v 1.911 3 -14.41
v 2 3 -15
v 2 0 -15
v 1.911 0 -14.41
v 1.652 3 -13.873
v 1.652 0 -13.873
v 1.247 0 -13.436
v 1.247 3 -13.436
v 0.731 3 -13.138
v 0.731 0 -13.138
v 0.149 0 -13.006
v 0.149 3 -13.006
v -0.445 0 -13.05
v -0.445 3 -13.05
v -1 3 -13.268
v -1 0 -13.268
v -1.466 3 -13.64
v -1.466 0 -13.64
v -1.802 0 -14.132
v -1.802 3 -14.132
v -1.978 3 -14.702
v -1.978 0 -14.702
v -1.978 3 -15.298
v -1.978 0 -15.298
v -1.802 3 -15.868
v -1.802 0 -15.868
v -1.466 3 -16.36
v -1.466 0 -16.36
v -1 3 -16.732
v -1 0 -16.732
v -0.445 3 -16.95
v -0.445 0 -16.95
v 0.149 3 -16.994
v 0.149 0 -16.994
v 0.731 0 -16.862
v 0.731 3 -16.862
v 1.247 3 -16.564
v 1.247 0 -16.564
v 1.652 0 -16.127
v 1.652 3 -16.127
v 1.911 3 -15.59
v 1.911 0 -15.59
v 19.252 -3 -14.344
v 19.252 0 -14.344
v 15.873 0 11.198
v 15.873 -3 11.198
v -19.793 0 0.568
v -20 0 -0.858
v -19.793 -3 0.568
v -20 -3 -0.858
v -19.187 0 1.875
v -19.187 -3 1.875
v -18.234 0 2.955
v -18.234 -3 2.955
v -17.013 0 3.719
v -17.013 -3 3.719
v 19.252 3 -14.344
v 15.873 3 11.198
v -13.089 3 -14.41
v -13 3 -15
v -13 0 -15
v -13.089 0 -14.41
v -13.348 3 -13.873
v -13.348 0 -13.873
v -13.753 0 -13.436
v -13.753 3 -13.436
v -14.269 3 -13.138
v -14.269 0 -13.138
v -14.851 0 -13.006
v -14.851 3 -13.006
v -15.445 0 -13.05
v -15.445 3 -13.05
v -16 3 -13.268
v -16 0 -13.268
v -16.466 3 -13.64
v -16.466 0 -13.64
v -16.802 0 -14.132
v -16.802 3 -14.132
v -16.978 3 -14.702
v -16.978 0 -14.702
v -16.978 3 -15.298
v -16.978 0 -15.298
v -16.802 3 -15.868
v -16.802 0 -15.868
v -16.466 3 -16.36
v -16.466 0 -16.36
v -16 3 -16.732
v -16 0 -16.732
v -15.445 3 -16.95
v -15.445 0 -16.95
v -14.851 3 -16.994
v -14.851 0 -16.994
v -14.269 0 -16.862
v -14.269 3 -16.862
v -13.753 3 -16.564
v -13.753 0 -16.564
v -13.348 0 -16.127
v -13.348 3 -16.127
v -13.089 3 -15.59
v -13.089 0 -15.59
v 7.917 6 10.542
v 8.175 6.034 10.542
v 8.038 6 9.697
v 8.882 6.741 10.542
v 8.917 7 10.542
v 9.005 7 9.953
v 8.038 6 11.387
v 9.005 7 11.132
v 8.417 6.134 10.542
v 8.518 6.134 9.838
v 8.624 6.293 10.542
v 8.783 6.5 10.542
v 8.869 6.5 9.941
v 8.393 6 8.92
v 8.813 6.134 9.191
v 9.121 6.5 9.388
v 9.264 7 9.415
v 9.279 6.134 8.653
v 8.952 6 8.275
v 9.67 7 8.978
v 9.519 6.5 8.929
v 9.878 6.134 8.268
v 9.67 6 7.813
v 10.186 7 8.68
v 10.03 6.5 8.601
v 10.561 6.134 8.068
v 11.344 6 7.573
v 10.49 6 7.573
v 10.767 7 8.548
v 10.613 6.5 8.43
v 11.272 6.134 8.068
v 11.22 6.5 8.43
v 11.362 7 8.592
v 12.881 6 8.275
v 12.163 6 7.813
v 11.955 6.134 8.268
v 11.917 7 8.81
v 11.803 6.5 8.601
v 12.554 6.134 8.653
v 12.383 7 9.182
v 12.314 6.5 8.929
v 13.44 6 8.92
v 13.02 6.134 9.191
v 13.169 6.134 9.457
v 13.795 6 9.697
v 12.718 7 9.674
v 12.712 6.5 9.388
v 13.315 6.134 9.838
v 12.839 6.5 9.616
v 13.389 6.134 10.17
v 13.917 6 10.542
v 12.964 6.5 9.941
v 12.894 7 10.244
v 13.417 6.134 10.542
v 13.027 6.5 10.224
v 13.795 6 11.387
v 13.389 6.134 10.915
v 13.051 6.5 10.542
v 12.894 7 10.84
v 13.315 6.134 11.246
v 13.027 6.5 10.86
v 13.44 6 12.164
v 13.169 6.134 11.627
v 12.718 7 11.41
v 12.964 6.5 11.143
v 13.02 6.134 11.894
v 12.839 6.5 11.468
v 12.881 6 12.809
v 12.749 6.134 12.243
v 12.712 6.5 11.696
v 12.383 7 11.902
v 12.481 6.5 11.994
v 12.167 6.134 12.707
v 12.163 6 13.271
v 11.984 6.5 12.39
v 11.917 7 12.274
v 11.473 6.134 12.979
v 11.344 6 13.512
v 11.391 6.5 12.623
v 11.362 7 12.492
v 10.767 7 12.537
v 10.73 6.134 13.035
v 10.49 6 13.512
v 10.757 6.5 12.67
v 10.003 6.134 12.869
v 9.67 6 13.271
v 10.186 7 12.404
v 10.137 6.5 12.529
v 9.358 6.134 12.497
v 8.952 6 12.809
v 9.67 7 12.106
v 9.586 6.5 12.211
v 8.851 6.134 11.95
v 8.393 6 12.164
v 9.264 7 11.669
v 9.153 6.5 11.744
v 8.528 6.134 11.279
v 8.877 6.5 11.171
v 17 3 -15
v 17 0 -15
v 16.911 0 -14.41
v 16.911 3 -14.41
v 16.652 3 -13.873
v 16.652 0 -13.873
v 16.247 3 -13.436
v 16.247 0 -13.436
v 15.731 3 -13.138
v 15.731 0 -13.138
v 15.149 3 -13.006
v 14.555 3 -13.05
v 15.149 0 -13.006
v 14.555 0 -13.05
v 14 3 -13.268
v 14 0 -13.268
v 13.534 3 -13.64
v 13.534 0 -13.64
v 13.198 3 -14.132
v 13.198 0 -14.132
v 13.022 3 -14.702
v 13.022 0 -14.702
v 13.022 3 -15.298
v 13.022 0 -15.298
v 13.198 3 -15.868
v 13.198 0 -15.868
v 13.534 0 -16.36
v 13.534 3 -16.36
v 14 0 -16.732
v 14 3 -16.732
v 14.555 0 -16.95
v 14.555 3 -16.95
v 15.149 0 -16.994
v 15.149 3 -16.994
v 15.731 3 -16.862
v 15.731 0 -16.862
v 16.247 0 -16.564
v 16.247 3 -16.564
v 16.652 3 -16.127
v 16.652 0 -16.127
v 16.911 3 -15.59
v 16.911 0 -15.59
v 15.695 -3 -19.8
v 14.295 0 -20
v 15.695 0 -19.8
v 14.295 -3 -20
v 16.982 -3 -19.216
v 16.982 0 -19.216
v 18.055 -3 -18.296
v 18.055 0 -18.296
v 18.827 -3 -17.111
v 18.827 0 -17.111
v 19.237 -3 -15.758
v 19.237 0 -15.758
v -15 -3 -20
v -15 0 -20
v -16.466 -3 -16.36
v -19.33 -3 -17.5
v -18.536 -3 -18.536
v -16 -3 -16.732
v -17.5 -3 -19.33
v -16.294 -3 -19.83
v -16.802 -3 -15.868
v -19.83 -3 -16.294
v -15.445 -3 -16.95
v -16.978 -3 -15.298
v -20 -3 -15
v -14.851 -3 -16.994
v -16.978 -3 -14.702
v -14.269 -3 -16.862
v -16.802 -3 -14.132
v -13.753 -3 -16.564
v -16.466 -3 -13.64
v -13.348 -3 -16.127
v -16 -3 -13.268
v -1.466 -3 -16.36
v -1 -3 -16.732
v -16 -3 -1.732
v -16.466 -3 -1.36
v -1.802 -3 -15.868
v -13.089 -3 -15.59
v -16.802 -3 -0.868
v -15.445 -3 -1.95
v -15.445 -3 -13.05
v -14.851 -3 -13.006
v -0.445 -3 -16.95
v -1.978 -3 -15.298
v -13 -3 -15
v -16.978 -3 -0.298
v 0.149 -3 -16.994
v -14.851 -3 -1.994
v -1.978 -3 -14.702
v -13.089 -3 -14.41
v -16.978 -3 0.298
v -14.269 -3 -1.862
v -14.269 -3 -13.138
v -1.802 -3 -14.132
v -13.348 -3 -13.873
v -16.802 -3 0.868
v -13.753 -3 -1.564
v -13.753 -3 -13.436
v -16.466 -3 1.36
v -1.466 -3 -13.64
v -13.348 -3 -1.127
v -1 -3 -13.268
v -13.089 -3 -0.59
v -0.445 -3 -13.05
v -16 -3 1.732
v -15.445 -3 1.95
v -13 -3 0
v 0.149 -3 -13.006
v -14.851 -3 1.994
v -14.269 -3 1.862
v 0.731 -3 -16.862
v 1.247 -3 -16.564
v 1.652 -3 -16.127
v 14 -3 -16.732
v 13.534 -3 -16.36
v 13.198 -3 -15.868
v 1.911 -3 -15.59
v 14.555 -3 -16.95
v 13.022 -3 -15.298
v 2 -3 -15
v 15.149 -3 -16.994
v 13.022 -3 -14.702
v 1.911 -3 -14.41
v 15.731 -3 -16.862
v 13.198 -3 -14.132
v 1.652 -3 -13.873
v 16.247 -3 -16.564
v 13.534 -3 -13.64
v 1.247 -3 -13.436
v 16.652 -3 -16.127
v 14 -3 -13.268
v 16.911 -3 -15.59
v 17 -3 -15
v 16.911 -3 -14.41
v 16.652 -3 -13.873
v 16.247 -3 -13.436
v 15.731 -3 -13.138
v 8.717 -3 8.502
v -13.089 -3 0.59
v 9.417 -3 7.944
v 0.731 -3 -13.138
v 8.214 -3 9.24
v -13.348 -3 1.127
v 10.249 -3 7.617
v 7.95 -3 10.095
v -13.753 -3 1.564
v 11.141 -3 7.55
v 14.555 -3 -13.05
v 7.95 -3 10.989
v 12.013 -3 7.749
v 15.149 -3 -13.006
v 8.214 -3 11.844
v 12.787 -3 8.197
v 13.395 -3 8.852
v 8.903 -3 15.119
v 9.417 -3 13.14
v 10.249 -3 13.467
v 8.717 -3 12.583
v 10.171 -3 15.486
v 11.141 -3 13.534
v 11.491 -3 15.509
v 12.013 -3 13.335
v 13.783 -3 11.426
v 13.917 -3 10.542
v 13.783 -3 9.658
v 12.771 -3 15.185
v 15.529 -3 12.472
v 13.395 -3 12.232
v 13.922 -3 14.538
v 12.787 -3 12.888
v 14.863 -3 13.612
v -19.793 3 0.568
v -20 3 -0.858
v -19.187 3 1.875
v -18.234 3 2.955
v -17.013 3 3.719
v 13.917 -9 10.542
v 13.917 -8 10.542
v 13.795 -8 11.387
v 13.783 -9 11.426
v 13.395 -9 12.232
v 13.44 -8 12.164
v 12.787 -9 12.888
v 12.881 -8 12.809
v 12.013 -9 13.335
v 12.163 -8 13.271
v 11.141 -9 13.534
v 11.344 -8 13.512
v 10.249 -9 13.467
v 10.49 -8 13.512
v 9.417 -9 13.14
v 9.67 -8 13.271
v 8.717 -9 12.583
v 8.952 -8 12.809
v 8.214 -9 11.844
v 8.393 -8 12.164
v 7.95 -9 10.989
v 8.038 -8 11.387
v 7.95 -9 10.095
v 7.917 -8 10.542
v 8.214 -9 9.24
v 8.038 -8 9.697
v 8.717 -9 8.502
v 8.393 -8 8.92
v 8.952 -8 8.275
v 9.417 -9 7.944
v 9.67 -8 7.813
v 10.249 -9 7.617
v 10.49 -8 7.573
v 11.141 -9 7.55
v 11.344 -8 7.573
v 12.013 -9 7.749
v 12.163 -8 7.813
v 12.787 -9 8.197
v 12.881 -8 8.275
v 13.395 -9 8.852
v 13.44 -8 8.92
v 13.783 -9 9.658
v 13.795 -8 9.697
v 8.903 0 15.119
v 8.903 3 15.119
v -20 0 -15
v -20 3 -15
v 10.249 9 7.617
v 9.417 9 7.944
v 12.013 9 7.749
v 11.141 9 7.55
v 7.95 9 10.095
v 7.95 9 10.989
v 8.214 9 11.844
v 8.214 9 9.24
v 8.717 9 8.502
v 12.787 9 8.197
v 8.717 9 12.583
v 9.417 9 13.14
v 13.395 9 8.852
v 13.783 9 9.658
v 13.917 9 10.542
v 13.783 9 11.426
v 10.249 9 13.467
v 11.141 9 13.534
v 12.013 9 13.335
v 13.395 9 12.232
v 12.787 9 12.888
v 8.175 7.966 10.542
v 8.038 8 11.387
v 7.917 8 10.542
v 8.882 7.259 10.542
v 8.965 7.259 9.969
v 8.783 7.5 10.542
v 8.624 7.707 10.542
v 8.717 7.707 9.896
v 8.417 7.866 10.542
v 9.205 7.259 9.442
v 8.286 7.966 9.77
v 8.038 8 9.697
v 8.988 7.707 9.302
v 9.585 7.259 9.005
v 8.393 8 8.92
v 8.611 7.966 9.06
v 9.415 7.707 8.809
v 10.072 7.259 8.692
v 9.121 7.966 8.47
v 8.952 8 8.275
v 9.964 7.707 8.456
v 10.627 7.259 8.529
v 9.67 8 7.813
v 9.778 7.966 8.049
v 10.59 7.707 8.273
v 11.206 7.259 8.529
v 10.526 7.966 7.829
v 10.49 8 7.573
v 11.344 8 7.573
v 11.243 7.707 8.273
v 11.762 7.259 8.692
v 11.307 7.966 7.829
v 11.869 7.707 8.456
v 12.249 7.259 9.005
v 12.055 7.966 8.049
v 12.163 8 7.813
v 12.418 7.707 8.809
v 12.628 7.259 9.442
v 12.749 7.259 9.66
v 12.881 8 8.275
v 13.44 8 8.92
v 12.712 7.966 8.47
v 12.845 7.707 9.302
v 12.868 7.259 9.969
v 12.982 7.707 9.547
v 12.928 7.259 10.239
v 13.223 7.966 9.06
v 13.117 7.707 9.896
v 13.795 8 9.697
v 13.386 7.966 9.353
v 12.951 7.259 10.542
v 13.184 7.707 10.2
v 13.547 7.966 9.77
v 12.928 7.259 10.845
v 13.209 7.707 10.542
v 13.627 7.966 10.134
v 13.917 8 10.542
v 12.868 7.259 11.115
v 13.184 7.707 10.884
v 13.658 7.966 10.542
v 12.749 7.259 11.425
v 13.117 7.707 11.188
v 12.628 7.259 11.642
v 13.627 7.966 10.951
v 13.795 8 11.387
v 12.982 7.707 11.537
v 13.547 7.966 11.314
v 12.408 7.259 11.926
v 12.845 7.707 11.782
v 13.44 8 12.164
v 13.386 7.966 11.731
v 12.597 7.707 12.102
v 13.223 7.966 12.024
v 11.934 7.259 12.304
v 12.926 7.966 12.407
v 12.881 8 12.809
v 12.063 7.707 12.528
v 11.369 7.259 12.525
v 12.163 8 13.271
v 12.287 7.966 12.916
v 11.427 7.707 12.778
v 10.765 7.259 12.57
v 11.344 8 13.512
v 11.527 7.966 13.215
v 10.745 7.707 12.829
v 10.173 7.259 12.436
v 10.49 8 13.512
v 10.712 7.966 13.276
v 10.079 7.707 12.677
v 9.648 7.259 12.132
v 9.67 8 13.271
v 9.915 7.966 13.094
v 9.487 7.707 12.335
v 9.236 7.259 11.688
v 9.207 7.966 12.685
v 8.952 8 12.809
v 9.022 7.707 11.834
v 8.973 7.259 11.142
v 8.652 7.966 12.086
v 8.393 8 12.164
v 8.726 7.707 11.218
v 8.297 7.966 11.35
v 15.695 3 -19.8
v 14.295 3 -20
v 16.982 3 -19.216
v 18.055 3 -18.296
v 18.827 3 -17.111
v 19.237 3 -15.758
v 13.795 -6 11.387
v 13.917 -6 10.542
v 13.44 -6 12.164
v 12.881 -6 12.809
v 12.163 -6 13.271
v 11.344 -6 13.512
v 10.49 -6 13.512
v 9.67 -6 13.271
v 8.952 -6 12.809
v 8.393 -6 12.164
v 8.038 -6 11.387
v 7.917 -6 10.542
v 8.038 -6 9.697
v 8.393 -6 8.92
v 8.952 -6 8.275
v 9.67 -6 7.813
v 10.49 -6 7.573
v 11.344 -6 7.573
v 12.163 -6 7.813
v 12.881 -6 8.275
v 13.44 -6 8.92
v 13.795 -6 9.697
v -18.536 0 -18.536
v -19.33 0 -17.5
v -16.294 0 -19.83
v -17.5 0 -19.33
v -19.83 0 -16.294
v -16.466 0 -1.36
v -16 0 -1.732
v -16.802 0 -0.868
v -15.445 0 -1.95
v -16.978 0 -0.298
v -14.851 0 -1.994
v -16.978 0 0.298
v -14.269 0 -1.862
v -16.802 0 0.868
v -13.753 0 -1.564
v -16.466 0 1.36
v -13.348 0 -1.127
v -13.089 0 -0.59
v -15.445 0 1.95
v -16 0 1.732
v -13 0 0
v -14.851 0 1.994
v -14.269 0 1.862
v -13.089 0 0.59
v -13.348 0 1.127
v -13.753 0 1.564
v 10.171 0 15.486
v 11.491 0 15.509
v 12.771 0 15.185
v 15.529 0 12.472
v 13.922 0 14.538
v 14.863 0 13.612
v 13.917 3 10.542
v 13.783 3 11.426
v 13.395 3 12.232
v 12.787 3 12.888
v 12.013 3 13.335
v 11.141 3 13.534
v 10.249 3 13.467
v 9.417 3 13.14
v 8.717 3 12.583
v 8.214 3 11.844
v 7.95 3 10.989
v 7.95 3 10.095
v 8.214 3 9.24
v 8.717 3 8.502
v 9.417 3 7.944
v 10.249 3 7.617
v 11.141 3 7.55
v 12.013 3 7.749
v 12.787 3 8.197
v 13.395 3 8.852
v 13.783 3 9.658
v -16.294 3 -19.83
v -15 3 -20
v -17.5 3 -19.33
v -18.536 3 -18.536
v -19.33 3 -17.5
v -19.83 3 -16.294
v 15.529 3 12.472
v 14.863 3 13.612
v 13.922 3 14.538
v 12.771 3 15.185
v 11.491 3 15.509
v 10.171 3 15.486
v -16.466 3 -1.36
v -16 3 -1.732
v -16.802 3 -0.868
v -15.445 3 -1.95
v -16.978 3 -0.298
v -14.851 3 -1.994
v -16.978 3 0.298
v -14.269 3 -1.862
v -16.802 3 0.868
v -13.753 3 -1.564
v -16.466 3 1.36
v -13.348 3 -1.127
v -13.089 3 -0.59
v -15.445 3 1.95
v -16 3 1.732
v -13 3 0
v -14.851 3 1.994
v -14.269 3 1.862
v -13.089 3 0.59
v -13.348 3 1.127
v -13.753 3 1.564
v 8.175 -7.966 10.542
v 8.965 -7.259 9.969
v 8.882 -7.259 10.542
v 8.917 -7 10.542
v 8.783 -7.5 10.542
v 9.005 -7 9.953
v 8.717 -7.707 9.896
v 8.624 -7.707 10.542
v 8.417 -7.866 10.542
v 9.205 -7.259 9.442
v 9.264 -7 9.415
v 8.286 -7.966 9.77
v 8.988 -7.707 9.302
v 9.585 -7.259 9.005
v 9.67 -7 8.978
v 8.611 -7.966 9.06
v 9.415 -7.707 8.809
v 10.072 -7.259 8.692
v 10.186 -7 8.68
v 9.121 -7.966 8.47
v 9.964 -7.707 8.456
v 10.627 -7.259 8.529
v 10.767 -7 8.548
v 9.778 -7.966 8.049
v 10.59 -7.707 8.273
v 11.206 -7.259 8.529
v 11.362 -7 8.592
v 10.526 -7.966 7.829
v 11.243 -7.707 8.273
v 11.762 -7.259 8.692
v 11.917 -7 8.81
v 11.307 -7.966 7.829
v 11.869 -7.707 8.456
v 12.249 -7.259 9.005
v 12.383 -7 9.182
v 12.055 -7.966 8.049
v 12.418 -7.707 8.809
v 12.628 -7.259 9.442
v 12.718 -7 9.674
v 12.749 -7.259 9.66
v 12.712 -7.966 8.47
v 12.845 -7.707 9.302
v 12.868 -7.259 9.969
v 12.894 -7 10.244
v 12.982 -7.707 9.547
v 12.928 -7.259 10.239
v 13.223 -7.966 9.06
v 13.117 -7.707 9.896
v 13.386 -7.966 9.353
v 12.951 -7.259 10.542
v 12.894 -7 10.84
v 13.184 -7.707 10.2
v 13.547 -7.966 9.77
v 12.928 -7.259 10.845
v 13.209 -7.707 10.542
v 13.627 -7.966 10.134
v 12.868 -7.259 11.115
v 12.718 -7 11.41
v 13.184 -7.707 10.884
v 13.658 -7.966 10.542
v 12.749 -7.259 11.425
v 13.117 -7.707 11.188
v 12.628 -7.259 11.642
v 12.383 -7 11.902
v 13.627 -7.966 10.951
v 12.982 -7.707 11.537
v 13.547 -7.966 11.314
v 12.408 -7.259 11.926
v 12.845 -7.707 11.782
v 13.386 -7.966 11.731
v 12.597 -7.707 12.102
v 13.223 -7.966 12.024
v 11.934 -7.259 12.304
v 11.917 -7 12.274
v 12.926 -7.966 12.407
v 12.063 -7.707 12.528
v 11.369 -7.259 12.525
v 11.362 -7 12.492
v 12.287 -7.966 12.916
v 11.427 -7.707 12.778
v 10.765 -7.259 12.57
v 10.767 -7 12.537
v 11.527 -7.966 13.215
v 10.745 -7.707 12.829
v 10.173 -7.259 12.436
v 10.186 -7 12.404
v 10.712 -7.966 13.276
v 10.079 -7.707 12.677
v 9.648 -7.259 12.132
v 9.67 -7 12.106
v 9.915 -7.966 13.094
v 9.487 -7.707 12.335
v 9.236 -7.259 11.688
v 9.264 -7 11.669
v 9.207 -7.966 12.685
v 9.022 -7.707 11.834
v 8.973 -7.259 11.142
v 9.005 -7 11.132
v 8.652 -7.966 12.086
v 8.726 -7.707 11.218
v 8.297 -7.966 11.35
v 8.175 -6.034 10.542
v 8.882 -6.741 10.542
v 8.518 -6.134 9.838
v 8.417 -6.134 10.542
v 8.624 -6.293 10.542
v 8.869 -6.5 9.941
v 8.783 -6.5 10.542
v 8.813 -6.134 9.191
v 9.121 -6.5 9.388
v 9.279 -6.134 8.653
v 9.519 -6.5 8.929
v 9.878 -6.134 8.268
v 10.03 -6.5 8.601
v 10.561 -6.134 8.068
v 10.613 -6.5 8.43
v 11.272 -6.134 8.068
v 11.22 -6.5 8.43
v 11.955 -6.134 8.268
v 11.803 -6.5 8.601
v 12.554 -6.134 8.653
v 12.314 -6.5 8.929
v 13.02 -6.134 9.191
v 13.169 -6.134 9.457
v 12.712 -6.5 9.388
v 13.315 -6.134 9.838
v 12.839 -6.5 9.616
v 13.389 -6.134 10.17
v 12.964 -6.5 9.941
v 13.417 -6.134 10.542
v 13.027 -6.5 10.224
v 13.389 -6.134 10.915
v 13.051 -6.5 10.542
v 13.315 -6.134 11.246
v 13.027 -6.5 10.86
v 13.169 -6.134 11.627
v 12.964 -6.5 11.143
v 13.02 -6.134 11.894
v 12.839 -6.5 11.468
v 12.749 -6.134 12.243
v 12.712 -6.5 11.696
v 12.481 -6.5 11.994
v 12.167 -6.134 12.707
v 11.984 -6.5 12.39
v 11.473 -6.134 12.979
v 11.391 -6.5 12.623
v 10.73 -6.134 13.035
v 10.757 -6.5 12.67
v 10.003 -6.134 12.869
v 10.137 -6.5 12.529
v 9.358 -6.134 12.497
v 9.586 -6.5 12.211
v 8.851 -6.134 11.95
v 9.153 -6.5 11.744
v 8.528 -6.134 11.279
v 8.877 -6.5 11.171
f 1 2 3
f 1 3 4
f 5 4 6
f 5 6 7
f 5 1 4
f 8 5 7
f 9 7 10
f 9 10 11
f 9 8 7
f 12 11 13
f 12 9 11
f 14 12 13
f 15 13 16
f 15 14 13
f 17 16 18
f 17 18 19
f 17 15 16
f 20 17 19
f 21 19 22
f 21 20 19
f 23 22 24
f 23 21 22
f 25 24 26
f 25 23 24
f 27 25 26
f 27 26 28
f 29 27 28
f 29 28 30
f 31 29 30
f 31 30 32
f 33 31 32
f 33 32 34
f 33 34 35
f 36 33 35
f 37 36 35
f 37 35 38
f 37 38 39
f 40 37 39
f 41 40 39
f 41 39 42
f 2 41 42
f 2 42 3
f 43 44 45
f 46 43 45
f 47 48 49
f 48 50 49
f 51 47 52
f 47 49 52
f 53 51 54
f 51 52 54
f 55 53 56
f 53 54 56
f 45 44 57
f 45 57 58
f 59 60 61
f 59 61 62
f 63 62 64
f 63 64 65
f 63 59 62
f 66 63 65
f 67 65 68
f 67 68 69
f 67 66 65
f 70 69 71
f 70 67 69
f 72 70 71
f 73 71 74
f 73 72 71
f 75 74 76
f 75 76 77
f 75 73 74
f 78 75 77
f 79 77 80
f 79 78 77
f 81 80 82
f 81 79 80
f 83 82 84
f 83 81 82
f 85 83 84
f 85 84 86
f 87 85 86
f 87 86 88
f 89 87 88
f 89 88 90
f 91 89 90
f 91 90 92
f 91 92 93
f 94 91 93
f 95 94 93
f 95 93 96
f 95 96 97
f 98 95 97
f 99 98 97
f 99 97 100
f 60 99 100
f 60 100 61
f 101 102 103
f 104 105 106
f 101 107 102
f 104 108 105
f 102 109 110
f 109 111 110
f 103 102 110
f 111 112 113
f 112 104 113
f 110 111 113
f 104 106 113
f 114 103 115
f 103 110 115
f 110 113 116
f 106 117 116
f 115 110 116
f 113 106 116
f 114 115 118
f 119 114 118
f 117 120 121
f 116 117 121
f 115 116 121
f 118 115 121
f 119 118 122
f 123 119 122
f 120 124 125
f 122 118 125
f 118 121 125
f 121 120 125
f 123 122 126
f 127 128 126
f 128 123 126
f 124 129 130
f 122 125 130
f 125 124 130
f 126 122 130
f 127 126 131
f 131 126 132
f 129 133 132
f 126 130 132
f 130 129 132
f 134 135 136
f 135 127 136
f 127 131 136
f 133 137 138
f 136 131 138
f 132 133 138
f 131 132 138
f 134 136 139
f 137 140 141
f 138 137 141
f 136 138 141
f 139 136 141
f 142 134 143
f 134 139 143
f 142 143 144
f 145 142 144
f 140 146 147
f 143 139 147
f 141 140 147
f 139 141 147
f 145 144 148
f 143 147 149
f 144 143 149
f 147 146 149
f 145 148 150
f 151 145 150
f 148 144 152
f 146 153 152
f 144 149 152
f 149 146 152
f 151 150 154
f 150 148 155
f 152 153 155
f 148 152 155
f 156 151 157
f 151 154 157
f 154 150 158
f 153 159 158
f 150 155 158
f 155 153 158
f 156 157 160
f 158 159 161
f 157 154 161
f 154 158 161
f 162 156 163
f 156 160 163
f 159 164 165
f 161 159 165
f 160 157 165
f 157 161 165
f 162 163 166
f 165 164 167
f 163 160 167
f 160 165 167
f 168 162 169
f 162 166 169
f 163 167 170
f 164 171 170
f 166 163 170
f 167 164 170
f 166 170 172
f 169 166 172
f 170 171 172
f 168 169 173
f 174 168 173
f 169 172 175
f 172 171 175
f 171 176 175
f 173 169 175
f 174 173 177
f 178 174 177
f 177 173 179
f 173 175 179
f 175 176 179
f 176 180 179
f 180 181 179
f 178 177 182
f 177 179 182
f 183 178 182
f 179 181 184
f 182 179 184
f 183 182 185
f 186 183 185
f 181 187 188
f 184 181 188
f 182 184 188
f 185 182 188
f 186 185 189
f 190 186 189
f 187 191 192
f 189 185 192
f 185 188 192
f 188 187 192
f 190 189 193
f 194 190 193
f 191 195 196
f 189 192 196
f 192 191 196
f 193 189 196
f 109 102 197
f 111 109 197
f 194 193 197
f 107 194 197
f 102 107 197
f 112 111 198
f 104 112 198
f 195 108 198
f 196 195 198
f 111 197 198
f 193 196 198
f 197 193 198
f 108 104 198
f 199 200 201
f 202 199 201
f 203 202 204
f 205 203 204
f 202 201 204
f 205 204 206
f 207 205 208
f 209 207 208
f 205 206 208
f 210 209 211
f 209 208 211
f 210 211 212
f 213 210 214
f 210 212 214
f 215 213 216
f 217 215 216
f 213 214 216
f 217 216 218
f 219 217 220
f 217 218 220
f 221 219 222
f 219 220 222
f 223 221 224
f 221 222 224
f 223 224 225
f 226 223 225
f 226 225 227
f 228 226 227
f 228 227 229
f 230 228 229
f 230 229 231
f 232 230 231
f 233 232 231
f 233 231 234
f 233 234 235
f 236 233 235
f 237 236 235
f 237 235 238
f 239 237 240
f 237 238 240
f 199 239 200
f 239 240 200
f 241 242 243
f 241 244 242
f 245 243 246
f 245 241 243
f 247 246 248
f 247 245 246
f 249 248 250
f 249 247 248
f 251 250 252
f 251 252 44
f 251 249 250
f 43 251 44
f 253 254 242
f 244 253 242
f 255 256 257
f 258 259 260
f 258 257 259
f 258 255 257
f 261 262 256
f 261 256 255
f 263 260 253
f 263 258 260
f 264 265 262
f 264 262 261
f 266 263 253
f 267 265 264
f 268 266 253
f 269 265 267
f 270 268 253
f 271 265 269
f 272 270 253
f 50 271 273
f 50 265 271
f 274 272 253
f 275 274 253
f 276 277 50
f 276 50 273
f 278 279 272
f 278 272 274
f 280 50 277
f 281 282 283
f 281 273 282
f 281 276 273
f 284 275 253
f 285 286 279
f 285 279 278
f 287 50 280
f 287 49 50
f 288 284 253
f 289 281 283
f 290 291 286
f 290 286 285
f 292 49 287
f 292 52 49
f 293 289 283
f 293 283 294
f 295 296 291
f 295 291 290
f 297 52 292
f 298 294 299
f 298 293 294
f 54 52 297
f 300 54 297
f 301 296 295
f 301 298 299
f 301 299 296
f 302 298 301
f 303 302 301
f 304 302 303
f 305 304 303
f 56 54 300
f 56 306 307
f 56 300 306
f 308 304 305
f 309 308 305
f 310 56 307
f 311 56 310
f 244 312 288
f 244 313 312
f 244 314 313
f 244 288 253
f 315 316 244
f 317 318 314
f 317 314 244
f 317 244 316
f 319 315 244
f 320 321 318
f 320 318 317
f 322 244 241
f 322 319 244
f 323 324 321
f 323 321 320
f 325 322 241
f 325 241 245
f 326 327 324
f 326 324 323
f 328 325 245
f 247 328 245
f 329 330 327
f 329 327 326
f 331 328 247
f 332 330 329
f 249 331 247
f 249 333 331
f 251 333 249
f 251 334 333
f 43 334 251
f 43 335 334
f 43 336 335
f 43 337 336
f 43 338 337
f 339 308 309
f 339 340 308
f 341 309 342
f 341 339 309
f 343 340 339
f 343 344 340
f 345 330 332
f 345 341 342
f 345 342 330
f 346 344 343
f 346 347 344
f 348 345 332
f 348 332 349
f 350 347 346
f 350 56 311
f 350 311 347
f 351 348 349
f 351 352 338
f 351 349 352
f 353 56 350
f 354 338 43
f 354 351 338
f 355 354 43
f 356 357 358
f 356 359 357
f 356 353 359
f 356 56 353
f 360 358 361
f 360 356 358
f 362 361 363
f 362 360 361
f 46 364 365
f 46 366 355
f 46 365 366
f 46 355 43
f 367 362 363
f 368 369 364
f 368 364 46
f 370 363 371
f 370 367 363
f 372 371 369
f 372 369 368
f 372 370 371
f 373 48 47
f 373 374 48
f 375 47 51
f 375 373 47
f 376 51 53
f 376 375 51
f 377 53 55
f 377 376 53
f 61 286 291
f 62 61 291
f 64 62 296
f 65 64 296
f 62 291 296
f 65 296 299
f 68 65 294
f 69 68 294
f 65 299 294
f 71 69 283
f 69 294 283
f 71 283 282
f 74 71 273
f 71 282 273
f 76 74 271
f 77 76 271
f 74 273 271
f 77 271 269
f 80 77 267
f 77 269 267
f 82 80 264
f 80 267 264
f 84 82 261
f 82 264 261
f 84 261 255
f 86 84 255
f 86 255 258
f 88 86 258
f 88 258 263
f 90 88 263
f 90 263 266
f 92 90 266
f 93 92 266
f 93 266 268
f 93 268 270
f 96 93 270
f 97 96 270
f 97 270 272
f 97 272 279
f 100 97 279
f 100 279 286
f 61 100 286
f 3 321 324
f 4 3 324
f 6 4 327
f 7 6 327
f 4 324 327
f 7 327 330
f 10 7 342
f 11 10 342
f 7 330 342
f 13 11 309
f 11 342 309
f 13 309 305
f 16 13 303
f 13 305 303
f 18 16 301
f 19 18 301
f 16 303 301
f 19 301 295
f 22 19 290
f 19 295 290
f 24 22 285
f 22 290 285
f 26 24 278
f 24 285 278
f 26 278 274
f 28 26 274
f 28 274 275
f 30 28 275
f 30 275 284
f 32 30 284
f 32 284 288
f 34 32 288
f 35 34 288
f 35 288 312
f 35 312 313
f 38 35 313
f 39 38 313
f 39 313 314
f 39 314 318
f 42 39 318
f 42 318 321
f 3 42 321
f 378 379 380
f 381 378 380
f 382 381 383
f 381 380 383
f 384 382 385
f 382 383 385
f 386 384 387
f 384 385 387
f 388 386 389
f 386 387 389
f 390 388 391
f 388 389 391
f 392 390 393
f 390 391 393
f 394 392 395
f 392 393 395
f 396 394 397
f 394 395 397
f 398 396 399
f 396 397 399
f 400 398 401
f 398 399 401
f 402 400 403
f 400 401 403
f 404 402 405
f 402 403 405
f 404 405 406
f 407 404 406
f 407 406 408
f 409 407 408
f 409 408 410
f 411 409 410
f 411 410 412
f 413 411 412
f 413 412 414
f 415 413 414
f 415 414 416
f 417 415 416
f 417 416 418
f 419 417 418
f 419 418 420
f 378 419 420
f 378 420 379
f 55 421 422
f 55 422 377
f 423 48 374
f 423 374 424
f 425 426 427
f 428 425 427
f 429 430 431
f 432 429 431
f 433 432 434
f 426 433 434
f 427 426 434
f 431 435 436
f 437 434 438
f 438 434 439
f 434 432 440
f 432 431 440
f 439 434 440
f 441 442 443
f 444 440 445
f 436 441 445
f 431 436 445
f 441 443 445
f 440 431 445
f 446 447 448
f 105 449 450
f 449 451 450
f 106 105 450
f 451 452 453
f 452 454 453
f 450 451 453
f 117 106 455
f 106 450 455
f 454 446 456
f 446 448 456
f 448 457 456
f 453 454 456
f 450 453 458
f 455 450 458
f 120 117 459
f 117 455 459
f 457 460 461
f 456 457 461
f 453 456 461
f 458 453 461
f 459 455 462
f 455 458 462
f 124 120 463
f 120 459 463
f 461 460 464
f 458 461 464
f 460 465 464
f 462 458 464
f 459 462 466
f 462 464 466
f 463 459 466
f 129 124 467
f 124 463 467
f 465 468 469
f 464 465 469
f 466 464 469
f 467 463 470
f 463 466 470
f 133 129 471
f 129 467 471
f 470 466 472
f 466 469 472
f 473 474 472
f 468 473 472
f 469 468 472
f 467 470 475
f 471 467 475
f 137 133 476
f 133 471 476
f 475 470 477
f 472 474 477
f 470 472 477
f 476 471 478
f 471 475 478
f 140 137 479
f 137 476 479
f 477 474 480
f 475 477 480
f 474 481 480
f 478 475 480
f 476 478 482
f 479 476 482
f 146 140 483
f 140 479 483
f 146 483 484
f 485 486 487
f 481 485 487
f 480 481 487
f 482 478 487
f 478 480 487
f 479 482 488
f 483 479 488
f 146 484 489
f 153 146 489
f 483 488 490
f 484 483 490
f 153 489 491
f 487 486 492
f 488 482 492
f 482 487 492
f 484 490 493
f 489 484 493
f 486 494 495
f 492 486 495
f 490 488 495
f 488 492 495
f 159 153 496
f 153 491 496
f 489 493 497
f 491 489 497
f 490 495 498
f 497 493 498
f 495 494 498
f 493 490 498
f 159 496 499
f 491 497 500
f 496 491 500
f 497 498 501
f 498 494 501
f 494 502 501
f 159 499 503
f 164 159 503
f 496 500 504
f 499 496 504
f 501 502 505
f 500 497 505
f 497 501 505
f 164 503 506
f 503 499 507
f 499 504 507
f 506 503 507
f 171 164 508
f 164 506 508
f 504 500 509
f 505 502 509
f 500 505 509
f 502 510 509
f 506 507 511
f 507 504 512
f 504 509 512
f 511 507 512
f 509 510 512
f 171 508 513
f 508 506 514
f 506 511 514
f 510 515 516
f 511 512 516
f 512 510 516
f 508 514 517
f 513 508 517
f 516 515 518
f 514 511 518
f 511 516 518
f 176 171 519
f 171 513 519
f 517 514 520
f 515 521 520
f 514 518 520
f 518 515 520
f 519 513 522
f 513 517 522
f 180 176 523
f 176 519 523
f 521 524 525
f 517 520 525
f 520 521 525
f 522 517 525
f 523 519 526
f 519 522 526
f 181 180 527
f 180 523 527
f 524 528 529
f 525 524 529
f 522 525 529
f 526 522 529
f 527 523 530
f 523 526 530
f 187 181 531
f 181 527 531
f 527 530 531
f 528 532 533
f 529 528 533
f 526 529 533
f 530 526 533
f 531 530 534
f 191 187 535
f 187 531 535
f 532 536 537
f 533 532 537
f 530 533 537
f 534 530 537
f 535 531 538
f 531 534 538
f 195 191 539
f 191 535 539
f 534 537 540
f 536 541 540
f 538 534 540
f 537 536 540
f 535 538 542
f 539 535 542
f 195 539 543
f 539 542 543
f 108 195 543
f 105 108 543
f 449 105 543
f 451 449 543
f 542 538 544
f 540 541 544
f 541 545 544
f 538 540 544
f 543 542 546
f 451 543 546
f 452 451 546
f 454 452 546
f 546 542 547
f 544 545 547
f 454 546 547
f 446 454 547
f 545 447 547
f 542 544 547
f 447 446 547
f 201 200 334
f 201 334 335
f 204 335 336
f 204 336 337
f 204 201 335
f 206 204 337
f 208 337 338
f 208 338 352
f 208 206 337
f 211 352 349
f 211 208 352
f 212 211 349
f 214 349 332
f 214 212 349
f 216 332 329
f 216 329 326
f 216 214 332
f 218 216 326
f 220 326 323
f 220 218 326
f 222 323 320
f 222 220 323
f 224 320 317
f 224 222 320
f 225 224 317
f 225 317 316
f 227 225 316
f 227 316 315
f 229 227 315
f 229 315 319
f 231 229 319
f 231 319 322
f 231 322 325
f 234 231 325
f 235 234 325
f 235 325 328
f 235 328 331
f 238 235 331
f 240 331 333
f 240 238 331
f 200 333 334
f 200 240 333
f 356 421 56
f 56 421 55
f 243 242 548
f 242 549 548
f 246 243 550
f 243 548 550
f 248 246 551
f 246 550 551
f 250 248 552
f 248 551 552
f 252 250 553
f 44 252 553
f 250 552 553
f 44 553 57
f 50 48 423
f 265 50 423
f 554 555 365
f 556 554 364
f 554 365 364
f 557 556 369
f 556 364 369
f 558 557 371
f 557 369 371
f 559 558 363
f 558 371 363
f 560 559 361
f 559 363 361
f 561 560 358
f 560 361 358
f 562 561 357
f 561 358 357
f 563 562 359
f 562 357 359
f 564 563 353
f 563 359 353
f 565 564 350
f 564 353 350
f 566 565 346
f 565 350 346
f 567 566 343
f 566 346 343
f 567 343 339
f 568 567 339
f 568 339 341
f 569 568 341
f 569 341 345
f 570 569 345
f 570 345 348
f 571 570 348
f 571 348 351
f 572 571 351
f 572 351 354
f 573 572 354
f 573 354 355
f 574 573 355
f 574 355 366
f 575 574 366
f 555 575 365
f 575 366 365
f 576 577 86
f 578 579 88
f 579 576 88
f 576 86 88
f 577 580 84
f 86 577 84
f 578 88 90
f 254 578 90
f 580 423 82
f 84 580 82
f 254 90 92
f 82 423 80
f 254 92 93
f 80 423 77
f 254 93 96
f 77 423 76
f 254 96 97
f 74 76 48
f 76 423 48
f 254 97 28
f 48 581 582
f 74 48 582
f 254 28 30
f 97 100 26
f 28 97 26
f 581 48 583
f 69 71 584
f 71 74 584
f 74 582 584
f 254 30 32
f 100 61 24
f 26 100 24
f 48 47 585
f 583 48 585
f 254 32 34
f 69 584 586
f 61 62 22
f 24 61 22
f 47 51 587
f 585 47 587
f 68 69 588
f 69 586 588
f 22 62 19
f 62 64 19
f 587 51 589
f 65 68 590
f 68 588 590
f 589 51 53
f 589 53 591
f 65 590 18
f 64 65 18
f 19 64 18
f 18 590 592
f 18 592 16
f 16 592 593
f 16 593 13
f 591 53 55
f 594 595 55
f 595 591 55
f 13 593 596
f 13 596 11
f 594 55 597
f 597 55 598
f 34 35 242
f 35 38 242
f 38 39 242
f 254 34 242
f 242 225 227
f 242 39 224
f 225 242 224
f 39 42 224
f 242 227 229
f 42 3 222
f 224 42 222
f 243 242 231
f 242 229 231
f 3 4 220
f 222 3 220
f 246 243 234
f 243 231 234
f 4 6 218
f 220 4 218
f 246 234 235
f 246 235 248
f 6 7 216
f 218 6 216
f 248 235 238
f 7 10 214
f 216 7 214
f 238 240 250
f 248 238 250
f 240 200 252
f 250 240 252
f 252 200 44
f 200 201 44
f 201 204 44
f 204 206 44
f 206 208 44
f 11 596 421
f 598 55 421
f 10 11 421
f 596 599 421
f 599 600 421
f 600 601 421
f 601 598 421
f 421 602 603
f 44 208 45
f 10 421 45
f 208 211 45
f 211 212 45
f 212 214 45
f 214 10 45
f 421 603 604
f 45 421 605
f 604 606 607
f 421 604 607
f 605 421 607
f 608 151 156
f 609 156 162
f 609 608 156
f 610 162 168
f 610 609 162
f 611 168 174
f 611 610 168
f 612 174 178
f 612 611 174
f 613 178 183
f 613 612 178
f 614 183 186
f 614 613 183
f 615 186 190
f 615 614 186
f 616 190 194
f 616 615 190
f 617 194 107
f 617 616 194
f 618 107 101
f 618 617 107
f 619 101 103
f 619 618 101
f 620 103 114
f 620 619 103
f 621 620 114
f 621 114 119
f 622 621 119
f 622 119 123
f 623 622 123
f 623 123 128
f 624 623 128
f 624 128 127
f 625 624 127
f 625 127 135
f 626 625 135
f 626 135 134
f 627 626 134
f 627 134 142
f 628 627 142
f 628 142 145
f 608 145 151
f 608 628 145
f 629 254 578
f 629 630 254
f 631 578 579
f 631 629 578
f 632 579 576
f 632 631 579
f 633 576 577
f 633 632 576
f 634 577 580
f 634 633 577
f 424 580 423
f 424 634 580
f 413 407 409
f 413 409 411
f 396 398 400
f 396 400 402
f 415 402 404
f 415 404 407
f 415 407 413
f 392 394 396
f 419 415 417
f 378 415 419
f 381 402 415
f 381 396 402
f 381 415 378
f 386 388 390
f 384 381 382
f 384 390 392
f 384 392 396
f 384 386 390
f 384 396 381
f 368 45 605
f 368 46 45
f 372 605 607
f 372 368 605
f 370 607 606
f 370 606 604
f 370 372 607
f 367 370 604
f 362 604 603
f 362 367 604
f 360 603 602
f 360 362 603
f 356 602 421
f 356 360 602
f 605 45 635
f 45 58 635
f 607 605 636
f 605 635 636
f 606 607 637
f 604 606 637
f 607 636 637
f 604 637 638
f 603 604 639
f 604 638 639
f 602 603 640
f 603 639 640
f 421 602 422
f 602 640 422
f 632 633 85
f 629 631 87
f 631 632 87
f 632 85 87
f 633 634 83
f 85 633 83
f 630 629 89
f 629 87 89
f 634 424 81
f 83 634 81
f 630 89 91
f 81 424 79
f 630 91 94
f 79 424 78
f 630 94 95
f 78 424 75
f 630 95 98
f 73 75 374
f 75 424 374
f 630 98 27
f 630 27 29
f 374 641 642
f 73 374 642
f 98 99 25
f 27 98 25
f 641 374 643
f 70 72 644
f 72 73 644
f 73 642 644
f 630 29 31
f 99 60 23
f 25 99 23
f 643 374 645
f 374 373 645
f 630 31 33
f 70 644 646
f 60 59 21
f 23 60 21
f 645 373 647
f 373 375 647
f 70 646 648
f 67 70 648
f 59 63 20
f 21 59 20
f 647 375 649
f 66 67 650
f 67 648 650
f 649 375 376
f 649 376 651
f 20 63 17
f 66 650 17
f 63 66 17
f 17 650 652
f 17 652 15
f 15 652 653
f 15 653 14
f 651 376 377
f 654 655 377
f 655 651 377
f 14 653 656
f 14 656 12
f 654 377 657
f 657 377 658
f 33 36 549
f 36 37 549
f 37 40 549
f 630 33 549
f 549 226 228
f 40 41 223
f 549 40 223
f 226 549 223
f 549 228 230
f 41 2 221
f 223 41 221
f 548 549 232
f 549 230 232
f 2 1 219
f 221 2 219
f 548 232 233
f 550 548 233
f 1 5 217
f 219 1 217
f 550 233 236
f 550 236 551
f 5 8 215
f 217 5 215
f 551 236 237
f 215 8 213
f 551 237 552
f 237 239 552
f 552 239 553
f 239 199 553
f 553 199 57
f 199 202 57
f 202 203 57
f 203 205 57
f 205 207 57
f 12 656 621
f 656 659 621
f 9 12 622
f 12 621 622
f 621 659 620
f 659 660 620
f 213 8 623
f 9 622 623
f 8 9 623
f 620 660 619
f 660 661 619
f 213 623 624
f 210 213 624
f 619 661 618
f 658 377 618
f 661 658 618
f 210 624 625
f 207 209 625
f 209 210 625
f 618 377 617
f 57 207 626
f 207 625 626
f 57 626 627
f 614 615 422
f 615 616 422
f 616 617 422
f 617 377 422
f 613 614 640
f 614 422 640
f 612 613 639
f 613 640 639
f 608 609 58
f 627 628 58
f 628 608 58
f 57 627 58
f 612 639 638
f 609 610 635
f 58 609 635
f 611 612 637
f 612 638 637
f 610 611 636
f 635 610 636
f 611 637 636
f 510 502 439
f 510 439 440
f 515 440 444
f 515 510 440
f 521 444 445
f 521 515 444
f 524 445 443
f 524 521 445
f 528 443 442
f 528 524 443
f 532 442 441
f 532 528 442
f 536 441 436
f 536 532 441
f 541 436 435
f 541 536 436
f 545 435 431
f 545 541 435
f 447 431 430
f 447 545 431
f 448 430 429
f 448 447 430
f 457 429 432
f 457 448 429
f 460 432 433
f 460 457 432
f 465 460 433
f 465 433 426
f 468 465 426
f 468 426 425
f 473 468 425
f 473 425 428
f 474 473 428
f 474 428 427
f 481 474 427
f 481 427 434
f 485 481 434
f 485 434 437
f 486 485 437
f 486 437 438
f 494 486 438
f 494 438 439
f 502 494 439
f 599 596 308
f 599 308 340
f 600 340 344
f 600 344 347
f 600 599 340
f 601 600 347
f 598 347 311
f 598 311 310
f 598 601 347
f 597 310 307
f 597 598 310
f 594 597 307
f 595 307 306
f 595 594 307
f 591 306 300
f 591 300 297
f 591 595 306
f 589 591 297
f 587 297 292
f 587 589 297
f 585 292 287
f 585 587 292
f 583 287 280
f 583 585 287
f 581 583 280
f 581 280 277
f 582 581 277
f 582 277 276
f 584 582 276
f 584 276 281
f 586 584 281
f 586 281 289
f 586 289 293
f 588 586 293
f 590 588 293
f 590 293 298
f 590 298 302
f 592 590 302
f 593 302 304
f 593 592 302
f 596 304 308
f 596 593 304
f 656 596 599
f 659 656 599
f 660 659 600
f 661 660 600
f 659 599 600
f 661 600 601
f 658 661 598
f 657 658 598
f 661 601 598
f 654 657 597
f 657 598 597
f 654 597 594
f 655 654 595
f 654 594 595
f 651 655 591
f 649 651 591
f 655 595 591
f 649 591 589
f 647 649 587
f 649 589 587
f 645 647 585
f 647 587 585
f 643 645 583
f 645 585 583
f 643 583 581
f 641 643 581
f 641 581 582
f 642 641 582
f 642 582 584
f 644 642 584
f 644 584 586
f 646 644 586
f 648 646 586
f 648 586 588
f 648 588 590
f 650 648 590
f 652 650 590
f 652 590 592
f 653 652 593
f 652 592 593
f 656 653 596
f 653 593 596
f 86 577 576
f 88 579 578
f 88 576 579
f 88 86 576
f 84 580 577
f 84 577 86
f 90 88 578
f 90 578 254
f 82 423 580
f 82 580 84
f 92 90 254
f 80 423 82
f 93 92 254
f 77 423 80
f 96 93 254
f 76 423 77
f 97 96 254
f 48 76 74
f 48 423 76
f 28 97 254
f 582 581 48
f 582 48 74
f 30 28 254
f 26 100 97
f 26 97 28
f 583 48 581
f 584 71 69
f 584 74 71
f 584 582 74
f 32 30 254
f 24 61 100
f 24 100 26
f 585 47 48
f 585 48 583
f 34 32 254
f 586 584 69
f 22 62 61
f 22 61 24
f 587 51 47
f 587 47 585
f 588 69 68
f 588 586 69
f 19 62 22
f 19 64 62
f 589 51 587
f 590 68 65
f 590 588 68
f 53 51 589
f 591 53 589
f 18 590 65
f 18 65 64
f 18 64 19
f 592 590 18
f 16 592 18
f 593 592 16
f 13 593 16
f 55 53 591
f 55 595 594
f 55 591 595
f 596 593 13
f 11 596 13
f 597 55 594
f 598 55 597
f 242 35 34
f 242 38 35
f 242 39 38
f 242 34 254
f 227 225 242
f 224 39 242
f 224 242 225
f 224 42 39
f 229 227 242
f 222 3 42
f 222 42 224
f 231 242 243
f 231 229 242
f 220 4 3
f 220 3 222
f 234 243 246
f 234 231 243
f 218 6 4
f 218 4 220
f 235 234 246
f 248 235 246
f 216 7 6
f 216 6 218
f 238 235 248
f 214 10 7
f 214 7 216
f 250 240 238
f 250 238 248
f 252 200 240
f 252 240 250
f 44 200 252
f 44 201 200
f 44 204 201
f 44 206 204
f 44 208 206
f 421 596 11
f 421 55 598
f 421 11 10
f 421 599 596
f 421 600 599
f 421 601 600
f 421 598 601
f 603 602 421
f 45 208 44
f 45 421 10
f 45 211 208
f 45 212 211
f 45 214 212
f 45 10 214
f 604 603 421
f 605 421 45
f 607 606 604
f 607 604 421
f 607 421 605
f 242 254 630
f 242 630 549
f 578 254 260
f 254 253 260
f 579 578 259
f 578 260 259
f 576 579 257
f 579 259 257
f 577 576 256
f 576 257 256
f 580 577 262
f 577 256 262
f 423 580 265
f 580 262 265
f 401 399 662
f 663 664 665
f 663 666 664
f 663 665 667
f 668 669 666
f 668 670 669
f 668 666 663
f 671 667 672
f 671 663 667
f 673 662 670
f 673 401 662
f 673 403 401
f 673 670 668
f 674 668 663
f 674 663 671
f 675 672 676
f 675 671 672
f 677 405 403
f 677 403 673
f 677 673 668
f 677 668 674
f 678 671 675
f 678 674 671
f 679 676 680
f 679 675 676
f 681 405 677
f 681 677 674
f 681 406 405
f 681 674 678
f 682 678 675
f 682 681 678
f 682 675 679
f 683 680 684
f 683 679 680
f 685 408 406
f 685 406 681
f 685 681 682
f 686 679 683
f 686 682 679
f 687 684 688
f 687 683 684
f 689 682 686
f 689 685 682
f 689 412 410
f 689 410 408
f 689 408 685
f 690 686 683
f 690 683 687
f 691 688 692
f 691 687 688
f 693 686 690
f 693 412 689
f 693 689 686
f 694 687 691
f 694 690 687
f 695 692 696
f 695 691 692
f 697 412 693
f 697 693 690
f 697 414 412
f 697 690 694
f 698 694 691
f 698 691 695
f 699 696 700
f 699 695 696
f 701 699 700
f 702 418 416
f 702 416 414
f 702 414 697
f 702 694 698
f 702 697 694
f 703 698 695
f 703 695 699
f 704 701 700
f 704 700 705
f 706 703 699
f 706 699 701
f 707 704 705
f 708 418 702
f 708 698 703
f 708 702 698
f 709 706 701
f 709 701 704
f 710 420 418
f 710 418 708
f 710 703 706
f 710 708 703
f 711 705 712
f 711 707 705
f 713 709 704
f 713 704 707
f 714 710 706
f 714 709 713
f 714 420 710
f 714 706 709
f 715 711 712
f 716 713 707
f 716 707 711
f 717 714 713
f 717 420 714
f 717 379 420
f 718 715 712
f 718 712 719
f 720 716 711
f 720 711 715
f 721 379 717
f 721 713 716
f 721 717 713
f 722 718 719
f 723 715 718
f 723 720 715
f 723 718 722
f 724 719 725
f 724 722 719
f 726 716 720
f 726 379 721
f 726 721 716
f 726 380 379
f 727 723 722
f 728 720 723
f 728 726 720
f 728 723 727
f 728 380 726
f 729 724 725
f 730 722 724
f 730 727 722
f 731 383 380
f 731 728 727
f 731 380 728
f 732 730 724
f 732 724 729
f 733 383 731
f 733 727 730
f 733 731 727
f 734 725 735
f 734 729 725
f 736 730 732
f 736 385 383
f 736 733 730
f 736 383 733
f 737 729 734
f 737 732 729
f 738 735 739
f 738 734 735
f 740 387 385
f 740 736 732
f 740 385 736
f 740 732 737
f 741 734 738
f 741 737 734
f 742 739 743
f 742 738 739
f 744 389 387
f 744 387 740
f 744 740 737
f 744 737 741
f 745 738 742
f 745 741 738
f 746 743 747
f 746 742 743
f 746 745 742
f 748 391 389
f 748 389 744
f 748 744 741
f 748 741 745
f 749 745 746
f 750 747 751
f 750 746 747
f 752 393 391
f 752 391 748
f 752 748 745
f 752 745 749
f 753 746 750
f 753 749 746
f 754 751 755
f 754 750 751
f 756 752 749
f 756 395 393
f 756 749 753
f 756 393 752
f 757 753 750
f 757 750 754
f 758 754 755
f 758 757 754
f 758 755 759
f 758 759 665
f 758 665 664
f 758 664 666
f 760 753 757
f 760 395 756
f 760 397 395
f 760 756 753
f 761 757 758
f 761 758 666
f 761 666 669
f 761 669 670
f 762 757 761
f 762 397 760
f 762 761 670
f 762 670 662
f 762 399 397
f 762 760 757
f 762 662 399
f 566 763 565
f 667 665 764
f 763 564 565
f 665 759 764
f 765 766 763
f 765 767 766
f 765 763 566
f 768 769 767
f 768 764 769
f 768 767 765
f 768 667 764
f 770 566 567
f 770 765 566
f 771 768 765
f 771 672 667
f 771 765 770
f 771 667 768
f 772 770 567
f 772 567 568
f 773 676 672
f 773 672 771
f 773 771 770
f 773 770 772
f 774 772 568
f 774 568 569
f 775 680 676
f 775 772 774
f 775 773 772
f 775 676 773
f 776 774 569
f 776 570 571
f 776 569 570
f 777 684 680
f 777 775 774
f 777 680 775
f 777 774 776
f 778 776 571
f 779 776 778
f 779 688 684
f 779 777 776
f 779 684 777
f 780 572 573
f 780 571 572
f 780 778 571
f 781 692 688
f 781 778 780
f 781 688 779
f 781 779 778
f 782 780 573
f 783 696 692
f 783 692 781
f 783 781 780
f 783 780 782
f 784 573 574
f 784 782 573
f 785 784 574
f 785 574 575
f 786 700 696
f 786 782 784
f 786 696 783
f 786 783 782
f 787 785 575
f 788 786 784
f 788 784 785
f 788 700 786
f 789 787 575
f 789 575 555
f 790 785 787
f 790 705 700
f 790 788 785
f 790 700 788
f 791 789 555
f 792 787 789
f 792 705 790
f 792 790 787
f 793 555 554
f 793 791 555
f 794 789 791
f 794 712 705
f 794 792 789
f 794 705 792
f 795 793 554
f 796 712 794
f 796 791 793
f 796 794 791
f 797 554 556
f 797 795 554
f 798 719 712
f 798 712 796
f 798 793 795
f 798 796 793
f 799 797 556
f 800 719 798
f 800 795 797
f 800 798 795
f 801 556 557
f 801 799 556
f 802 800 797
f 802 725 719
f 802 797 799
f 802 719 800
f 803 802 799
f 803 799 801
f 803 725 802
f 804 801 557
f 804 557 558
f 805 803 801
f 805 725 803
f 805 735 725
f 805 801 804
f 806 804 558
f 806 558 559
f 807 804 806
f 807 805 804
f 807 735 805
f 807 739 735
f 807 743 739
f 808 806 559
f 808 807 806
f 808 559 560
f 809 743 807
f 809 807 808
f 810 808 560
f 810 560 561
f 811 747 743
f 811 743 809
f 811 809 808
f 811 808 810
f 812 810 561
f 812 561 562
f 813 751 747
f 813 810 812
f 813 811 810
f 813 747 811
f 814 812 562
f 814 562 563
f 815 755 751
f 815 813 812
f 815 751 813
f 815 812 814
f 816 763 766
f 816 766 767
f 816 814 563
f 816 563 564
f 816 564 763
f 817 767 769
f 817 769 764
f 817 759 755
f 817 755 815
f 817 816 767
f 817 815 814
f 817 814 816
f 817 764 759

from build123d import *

# Parameters (mm, degrees)
F0_R      = 2
F1_DEPTH  = 3
F2_R      = 5
F3_R      = 3
F4_DEPTH  = 6
F6_R      = 1
F8_R      = 5
F9_R      = 2
F10_DEPTH = 25


with BuildPart() as f1:
    # F0 (on Front) → F1 (new body)
    with BuildSketch(Plane.XZ):
        Polygon((-20, -20), (20, -20), (15, 17.800641), (-20, 2.405128), align=None)
        with Locations((15, -15)):
            Circle(F0_R, mode=Mode.SUBTRACT)
        with Locations((-15, 0)):
            Circle(F0_R, mode=Mode.SUBTRACT)
    extrude(amount=F1_DEPTH)

    # F2
    f2_edges = [f1.edges().sort_by_distance(p)[0] for p in [
        (15, -1.5, 17.800641),
        (-20, -1.5, 2.405128),
        (20, -1.5, -20),
    ]]
    fillet(f2_edges, radius=F2_R)

    # F3 (on face) → F4 (join)
    with BuildSketch(Plane.XZ.offset(3)):
        with Locations((10.916557, 10.542107)):
            Circle(F3_R)
    extrude(amount=F4_DEPTH)

    # F6 (on face) → F7 (revolve, cut)
    with BuildSketch(Plane(origin=(0, 0, 10.542107), x_dir=(1, 0, 0), z_dir=(0, 0, -1))):
        with Locations((7.916557, 7)):
            Circle(F6_R)
    revolve(axis=Axis((10.916557, -9, 10.542107), (0, -1, 0)), mode=Mode.SUBTRACT)

    # F8
    f8_edges = [f1.edges().sort_by_distance(p)[0] for p in [
        (-20, -1.5, -20),
    ]]
    fillet(f8_edges, radius=F8_R)

    # F9 (on face) → F10 (cut)
    with BuildSketch(Plane.XZ.offset(3)):
        with Locations((-15, -15)):
            Circle(F9_R)
        with Locations((0, -15)):
            Circle(F9_R)
    extrude(amount=-F10_DEPTH, mode=Mode.SUBTRACT)


with BuildPart() as f11_1:
    # F11: instance of F1
    add(f1.part.mirror(Plane.XZ))


solid = Compound([f1.part, f11_1.part])
